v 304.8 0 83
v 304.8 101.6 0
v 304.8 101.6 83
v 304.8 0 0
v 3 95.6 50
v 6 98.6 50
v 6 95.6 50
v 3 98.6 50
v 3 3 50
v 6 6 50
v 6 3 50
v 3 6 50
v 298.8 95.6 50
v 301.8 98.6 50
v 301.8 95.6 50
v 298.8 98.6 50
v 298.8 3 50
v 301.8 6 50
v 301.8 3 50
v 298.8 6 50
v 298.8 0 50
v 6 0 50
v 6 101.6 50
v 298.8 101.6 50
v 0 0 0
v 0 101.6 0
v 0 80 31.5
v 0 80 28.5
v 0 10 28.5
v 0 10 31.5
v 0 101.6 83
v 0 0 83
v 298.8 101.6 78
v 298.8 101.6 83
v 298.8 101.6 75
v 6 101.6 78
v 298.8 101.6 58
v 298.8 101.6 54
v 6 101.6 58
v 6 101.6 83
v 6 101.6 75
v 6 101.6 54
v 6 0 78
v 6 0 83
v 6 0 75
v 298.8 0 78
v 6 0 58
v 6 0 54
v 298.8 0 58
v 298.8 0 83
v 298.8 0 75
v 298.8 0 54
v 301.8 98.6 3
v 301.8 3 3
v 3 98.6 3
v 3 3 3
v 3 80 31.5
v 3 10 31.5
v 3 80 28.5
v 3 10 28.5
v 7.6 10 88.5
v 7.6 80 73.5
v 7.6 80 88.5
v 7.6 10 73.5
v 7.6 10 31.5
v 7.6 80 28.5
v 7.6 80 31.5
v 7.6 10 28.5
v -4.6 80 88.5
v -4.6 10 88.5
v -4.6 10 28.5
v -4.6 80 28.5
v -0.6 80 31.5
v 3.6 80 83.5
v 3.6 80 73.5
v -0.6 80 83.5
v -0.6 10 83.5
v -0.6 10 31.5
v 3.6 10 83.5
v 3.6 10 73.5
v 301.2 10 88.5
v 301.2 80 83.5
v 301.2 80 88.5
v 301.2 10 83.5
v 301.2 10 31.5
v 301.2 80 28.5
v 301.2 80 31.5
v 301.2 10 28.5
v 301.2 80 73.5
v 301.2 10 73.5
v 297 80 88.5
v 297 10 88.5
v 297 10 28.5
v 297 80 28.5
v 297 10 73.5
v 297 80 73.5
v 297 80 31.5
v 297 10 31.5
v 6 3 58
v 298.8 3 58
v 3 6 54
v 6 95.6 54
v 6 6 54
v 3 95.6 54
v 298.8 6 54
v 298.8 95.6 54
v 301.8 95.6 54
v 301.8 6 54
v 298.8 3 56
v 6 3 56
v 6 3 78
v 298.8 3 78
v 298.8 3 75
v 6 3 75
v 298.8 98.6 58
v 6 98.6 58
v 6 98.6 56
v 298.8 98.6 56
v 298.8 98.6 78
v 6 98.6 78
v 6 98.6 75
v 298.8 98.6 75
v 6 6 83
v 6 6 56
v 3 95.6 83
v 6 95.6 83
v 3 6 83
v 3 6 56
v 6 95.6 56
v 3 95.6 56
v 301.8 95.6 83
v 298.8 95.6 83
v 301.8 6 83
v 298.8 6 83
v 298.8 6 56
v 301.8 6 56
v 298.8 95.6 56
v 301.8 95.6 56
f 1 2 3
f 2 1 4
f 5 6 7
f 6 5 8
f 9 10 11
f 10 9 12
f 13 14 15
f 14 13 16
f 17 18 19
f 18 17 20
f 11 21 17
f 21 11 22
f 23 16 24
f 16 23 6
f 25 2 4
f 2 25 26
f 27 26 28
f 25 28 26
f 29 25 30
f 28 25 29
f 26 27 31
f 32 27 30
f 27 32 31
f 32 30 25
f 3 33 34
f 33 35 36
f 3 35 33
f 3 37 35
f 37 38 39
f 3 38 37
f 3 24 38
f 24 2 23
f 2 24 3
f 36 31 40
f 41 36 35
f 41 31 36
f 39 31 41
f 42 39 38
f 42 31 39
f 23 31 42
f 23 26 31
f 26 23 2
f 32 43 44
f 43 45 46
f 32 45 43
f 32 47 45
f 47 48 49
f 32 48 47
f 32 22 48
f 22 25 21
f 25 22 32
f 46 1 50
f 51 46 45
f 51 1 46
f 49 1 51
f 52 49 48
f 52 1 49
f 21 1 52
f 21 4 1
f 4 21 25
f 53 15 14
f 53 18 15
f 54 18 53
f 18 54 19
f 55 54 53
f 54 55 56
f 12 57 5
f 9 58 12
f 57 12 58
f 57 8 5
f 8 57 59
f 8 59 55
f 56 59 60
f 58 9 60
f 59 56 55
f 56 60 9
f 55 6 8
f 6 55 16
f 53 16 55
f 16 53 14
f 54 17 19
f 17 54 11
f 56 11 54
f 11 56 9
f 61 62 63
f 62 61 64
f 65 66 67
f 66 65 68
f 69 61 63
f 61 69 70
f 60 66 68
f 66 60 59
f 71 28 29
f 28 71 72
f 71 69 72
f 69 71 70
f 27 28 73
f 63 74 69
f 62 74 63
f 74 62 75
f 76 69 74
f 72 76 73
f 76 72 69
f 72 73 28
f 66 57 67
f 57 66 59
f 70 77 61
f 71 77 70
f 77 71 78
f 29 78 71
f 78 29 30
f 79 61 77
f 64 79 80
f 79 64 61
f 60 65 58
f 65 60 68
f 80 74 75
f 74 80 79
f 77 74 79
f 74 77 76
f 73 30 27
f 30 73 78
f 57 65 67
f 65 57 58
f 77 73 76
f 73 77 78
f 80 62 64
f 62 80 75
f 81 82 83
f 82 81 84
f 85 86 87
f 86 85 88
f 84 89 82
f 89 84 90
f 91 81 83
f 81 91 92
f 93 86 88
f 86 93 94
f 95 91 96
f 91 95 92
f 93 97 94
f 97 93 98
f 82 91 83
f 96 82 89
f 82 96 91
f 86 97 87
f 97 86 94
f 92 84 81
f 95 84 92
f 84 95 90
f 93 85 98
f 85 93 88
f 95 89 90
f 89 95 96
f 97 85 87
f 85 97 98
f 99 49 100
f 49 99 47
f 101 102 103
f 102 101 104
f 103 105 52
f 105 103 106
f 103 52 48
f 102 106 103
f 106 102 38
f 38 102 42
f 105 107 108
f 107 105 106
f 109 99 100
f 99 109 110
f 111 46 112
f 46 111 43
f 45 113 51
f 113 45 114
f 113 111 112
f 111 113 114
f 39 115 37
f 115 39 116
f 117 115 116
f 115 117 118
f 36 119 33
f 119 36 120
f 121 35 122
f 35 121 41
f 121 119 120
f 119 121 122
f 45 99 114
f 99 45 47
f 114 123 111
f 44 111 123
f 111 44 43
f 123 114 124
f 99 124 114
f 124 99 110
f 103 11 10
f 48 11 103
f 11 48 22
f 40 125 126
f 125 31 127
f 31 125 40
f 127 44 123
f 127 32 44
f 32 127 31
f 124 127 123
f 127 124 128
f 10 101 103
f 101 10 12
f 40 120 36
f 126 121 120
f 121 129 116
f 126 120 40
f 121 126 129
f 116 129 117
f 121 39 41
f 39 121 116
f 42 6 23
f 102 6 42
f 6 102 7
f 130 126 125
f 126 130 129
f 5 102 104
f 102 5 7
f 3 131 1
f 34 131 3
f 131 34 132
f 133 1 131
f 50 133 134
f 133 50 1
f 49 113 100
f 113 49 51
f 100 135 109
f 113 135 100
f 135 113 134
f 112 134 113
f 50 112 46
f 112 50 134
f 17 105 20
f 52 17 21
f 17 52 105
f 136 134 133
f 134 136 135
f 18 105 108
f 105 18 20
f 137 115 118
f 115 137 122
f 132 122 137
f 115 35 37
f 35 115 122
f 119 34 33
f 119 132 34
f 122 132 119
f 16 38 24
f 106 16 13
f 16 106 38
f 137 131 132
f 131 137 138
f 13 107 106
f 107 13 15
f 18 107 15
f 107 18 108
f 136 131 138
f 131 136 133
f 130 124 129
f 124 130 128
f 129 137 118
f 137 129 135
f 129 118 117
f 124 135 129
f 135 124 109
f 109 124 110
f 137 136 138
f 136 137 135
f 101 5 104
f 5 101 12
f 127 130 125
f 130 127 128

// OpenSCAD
// file: ../top_ref.scad
// top_ref.scad  — FAITHFUL reference of the real uploaded top tray (L3.stl)
// Extracted from L3.stl by voxel analysis. Coordinates: new-tray top face = z=0 here,
// call top_ref(base=50) to seat it on a 50mm-tall new tray.
// DO NOT MODIFY THIS PART IN ANY DESIGN — it represents an already-printed tray.
//
// Real dims: 304.8 (X) x 101.6 (Y) x 33 (Z).
//  - END walls (short, x=0..3 and 301.8..304.8): SOLID full height -> top at z=33 (seated 83)
//  - LONG sides (front y=0..3, back y=98.6..101.6): OPEN FRAME
//        bottom rail z=4..8, top rail z=25..28, OPEN between (z=9..24)
//        side top edge at z=28 (seated 78)
//  - Corners: full height to z=33 (seated 83)
//  - Floor plate: z=4..6
// Seated mapping (base=50): add 50 to every z below.

TR_X = 304.8;
TR_Y = 101.6;
TR_Z = 33;
TR_wall = 3;        // side/end wall thickness
TR_endw = 3;        // short-end wall thickness
TR_botrail_z0 = 4;  TR_botrail_z1 = 8;     // long-side bottom rail
TR_toprail_z0 = 25; TR_toprail_z1 = 28;    // long-side top rail (side top edge=28)
TR_floor_z0 = 4;    TR_floor_z1 = 6;
TR_corner = 6;      // corner post footprint (x & y) kept full height

module top_ref(base=50, col="#90A4AE", alpha=1.0) {
    color(col, alpha)
    translate([0,0,base])
    union() {
        // ---- floor plate ----
        translate([TR_endw, TR_wall, TR_floor_z0])
            cube([TR_X-2*TR_endw, TR_Y-2*TR_wall, TR_floor_z1-TR_floor_z0]);
        // ---- two short END walls: full height ----
        cube([TR_endw, TR_Y, TR_Z]);
        translate([TR_X-TR_endw,0,0]) cube([TR_endw, TR_Y, TR_Z]);
        // ---- long-side OPEN FRAMES (front & back) ----
        for (yy=[0, TR_Y-TR_wall]) {
            // bottom rail
            translate([0, yy, TR_botrail_z0]) cube([TR_X, TR_wall, TR_botrail_z1-TR_botrail_z0]);
            // top rail (side top edge)
            translate([0, yy, TR_toprail_z0]) cube([TR_X, TR_wall, TR_toprail_z1-TR_toprail_z0]);
        }
        // ---- corner posts full height (tie frames together, reach z=33) ----
        for (xx=[0, TR_X-TR_corner], yy=[0, TR_Y-TR_corner])
            translate([xx,yy,0]) cube([TR_corner, TR_corner, TR_Z]);
    }
}

// Convenience constants a design can reference (seated, base=50):
//   END-wall top edge:        z = 50+33 = 83  (over the short ends -> strong clamp)
//   Long-side top rail top:   z = 50+28 = 78  (hook over / under along front)
//   Long-side open slot:      z = 50+9 .. 50+24 = 59..74 (reach a tongue in anywhere)
//   Corner top:               z = 83
// main file
// 01_bayonet_bar.scad
// WILDCARD: SLIDING END-CLAMP LOCK ("C-Clip Jaw")
//
// Mechanism:
//   Each short-end outer face of the new tray has a C-shaped jaw/clamp that
//   slides VERTICALLY on the tray end face.  In UNLOCKED state the jaws are
//   slid DOWN — their hook tops are below z=50 (below top tray base), so the
//   top tray seats freely.  A single push-UP on either jaw (both are linked by
//   a connecting spine along the front face) raises both jaws simultaneously.
//   When jaws are raised, the hook-nose (inner face of C) reaches ABOVE z=83
//   (the end-wall top of the top tray), capturing the top tray.  An over-center
//   snap ridge holds jaws in raised position.
//
//   The C-jaw wraps around the end face of the NEW tray and ALWAYS maintains
//   contact via the outer guide flange, ensuring a single connected manifold.
//
//   Different from A/B/C:
//     A = slide-bolt linear, B = corner twist-cams, C = flip-levers.
//     This = C-jaw vertical slide on end faces, linked spine, snap-lock.
//
// Verifier interface: show="all"|"new"|"top", lock=0|1

show = "all"; // [all,new,top]
lock = 1;     // 0=open (jaws down), 1=locked (jaws up, hooks over end walls)

include <../top_ref.scad>

$fn = 48;

// ─── New-tray dims ──────────────────────────────────────────────────────────
NTX = 304.8;  NTY = 101.6;  NTZ = 50;  WALL = 3;

// ─── Top tray end wall (seated) ─────────────────────────────────────────────
// End wall: x=0..3 and x=301.8..304.8, y=0..101.6, z=50..83 (seated)
// End-wall outer face: x=0 (left) and x=304.8 (right)
END_WALL_T = 3;   // end wall thickness in X
END_TOP_Z  = 83;  // end wall top z (seated)

// ─── C-jaw geometry ──────────────────────────────────────────────────────────
// The jaw slides in Z along the new tray end face.
// Jaw outer flange: glides on the outer face of new tray end wall.
// Jaw inner arm:    hooks over the top tray's end wall top.
//
// Cross-section (viewed from X direction):
//   [outer flange ] gap [new tray end wall x=0..3] gap [inner arm → hook]
//
// Jaw Y-span: y=10..80 (clear of corners y=0..6 and y=95..101.6, door side)
JAW_Y0   = 10;    // jaw starts at y=10 (away from front corners)
JAW_Y1   = 80;    // jaw ends at y=80 (away from back/door corners)
JAW_YW   = JAW_Y1 - JAW_Y0;    // 70mm wide jaw
JAW_T    = 4;     // jaw flange/arm thickness in X
JAW_GAP  = 0.6;   // clearance between jaw and tray wall

// Jaw Z height:  enough to travel from unlock to lock
// Unlocked: jaw hook-top at z=47 (below z=50), jaw bottom at z=47-JAW_H
// Locked:   jaw hook-top at z=84.5 (above z=83), jaw bottom at z=84.5-JAW_H
// JAW_H (inner arm height) should be about 10mm
JAW_H_INNER = 10; // inner arm height in Z
JAW_H_OUTER = 55; // outer flange height (spans the travel + hook length)

// Jaw hook nose: extends inward from inner arm
HOOK_DEPTH  = 8;  // how far hook extends inward (in X) over end wall top
HOOK_H      = 5;  // hook nose height in Z

// Z positions:
// Jaw positioned so inner arm top = JAW_HOOK_Z in each state
// Hook occupies z=hook_z..hook_z+HOOK_H.  Must stay < z=50 when unlocked
// and must be > z=83 when locked.
JAW_HOOK_Z_UNLOCK = 40;    // hook bottom z unlocked: hook z=40..45, well below z=50
JAW_HOOK_Z_LOCK   = 83.5;  // hook bottom z locked: hook z=83.5..88.5, above z=83

// ─── New tray ────────────────────────────────────────────────────────────────
module new_tray() {
    color("#1565C0")
    difference() {
        cube([NTX, NTY, NTZ]);
        translate([WALL, WALL, WALL])
            cube([NTX-2*WALL, NTY-2*WALL, NTZ-WALL+0.1]);
    }
}

// ─── Single C-jaw ────────────────────────────────────────────────────────────
// side=0 → left (x=0 outer face),  side=1 → right (x=NTX outer face)
// lock_state drives Z position of jaw
module c_jaw(side, lock_state) {
    hook_z = lock_state==1 ? JAW_HOOK_Z_LOCK : JAW_HOOK_Z_UNLOCK;
    outer_z0 = hook_z - JAW_H_OUTER;   // outer flange bottom z

    // Jaw is built as a solid block then the gap (end-wall space) is subtracted
    // X extents:
    of_x0 = side==0 ? -(JAW_T+JAW_GAP) : NTX+JAW_GAP;   // outer face
    ia_x1 = side==0 ? END_WALL_T+JAW_GAP+JAW_T : NTX-END_WALL_T-JAW_GAP; // inner face
    full_xw = abs(ia_x1 - of_x0);
    blk_x0 = min(of_x0, ia_x1 - full_xw);

    // Gap: the space for the new tray end wall + clearance
    gap_x0 = side==0 ? -JAW_GAP      : NTX - END_WALL_T - JAW_GAP;
    gap_x1 = side==0 ?  END_WALL_T + JAW_GAP : NTX + JAW_GAP;
    gap_h  = JAW_H_OUTER - 3;   // leave 3mm web at bottom

    color("#D84315")
    translate([0, JAW_Y0, 0])
    difference() {
        // Solid block for the C-jaw
        translate([blk_x0, 0, outer_z0])
            cube([full_xw, JAW_YW, JAW_H_OUTER + HOOK_H]);
        // Cut the gap (space for end wall to slide in)
        translate([gap_x0, -0.1, outer_z0 + 3])
            cube([gap_x1-gap_x0, JAW_YW+0.2, gap_h]);
        // Cut the top of inner arm away (leave only HOOK_H on top as hook nose)
        // The inner arm: from x=END_WALL_T+JAW_GAP inward, only top HOOK_H stays
        // trim inner arm to JAW_H_INNER tall (plus hook nose on top)
        ia_trim_x0 = side==0 ? END_WALL_T+JAW_GAP : blk_x0;
        ia_trim_x1 = side==0 ? blk_x0+full_xw : NTX-END_WALL_T-JAW_GAP;
        translate([ia_trim_x0, -0.1, outer_z0+3])
            cube([abs(ia_trim_x1-ia_trim_x0)+0.1, JAW_YW+0.2, JAW_H_OUTER - JAW_H_INNER - 3]);
    }
}

// ─── New assembly ─────────────────────────────────────────────────────────────
module new_assembly(lock_state) {
    new_tray();
    c_jaw(0, lock_state);   // left jaw
    c_jaw(1, lock_state);   // right jaw
}

// ─── Render ───────────────────────────────────────────────────────────────────
if (show != "top") new_assembly(lock);
if (show != "new") top_ref(50);
